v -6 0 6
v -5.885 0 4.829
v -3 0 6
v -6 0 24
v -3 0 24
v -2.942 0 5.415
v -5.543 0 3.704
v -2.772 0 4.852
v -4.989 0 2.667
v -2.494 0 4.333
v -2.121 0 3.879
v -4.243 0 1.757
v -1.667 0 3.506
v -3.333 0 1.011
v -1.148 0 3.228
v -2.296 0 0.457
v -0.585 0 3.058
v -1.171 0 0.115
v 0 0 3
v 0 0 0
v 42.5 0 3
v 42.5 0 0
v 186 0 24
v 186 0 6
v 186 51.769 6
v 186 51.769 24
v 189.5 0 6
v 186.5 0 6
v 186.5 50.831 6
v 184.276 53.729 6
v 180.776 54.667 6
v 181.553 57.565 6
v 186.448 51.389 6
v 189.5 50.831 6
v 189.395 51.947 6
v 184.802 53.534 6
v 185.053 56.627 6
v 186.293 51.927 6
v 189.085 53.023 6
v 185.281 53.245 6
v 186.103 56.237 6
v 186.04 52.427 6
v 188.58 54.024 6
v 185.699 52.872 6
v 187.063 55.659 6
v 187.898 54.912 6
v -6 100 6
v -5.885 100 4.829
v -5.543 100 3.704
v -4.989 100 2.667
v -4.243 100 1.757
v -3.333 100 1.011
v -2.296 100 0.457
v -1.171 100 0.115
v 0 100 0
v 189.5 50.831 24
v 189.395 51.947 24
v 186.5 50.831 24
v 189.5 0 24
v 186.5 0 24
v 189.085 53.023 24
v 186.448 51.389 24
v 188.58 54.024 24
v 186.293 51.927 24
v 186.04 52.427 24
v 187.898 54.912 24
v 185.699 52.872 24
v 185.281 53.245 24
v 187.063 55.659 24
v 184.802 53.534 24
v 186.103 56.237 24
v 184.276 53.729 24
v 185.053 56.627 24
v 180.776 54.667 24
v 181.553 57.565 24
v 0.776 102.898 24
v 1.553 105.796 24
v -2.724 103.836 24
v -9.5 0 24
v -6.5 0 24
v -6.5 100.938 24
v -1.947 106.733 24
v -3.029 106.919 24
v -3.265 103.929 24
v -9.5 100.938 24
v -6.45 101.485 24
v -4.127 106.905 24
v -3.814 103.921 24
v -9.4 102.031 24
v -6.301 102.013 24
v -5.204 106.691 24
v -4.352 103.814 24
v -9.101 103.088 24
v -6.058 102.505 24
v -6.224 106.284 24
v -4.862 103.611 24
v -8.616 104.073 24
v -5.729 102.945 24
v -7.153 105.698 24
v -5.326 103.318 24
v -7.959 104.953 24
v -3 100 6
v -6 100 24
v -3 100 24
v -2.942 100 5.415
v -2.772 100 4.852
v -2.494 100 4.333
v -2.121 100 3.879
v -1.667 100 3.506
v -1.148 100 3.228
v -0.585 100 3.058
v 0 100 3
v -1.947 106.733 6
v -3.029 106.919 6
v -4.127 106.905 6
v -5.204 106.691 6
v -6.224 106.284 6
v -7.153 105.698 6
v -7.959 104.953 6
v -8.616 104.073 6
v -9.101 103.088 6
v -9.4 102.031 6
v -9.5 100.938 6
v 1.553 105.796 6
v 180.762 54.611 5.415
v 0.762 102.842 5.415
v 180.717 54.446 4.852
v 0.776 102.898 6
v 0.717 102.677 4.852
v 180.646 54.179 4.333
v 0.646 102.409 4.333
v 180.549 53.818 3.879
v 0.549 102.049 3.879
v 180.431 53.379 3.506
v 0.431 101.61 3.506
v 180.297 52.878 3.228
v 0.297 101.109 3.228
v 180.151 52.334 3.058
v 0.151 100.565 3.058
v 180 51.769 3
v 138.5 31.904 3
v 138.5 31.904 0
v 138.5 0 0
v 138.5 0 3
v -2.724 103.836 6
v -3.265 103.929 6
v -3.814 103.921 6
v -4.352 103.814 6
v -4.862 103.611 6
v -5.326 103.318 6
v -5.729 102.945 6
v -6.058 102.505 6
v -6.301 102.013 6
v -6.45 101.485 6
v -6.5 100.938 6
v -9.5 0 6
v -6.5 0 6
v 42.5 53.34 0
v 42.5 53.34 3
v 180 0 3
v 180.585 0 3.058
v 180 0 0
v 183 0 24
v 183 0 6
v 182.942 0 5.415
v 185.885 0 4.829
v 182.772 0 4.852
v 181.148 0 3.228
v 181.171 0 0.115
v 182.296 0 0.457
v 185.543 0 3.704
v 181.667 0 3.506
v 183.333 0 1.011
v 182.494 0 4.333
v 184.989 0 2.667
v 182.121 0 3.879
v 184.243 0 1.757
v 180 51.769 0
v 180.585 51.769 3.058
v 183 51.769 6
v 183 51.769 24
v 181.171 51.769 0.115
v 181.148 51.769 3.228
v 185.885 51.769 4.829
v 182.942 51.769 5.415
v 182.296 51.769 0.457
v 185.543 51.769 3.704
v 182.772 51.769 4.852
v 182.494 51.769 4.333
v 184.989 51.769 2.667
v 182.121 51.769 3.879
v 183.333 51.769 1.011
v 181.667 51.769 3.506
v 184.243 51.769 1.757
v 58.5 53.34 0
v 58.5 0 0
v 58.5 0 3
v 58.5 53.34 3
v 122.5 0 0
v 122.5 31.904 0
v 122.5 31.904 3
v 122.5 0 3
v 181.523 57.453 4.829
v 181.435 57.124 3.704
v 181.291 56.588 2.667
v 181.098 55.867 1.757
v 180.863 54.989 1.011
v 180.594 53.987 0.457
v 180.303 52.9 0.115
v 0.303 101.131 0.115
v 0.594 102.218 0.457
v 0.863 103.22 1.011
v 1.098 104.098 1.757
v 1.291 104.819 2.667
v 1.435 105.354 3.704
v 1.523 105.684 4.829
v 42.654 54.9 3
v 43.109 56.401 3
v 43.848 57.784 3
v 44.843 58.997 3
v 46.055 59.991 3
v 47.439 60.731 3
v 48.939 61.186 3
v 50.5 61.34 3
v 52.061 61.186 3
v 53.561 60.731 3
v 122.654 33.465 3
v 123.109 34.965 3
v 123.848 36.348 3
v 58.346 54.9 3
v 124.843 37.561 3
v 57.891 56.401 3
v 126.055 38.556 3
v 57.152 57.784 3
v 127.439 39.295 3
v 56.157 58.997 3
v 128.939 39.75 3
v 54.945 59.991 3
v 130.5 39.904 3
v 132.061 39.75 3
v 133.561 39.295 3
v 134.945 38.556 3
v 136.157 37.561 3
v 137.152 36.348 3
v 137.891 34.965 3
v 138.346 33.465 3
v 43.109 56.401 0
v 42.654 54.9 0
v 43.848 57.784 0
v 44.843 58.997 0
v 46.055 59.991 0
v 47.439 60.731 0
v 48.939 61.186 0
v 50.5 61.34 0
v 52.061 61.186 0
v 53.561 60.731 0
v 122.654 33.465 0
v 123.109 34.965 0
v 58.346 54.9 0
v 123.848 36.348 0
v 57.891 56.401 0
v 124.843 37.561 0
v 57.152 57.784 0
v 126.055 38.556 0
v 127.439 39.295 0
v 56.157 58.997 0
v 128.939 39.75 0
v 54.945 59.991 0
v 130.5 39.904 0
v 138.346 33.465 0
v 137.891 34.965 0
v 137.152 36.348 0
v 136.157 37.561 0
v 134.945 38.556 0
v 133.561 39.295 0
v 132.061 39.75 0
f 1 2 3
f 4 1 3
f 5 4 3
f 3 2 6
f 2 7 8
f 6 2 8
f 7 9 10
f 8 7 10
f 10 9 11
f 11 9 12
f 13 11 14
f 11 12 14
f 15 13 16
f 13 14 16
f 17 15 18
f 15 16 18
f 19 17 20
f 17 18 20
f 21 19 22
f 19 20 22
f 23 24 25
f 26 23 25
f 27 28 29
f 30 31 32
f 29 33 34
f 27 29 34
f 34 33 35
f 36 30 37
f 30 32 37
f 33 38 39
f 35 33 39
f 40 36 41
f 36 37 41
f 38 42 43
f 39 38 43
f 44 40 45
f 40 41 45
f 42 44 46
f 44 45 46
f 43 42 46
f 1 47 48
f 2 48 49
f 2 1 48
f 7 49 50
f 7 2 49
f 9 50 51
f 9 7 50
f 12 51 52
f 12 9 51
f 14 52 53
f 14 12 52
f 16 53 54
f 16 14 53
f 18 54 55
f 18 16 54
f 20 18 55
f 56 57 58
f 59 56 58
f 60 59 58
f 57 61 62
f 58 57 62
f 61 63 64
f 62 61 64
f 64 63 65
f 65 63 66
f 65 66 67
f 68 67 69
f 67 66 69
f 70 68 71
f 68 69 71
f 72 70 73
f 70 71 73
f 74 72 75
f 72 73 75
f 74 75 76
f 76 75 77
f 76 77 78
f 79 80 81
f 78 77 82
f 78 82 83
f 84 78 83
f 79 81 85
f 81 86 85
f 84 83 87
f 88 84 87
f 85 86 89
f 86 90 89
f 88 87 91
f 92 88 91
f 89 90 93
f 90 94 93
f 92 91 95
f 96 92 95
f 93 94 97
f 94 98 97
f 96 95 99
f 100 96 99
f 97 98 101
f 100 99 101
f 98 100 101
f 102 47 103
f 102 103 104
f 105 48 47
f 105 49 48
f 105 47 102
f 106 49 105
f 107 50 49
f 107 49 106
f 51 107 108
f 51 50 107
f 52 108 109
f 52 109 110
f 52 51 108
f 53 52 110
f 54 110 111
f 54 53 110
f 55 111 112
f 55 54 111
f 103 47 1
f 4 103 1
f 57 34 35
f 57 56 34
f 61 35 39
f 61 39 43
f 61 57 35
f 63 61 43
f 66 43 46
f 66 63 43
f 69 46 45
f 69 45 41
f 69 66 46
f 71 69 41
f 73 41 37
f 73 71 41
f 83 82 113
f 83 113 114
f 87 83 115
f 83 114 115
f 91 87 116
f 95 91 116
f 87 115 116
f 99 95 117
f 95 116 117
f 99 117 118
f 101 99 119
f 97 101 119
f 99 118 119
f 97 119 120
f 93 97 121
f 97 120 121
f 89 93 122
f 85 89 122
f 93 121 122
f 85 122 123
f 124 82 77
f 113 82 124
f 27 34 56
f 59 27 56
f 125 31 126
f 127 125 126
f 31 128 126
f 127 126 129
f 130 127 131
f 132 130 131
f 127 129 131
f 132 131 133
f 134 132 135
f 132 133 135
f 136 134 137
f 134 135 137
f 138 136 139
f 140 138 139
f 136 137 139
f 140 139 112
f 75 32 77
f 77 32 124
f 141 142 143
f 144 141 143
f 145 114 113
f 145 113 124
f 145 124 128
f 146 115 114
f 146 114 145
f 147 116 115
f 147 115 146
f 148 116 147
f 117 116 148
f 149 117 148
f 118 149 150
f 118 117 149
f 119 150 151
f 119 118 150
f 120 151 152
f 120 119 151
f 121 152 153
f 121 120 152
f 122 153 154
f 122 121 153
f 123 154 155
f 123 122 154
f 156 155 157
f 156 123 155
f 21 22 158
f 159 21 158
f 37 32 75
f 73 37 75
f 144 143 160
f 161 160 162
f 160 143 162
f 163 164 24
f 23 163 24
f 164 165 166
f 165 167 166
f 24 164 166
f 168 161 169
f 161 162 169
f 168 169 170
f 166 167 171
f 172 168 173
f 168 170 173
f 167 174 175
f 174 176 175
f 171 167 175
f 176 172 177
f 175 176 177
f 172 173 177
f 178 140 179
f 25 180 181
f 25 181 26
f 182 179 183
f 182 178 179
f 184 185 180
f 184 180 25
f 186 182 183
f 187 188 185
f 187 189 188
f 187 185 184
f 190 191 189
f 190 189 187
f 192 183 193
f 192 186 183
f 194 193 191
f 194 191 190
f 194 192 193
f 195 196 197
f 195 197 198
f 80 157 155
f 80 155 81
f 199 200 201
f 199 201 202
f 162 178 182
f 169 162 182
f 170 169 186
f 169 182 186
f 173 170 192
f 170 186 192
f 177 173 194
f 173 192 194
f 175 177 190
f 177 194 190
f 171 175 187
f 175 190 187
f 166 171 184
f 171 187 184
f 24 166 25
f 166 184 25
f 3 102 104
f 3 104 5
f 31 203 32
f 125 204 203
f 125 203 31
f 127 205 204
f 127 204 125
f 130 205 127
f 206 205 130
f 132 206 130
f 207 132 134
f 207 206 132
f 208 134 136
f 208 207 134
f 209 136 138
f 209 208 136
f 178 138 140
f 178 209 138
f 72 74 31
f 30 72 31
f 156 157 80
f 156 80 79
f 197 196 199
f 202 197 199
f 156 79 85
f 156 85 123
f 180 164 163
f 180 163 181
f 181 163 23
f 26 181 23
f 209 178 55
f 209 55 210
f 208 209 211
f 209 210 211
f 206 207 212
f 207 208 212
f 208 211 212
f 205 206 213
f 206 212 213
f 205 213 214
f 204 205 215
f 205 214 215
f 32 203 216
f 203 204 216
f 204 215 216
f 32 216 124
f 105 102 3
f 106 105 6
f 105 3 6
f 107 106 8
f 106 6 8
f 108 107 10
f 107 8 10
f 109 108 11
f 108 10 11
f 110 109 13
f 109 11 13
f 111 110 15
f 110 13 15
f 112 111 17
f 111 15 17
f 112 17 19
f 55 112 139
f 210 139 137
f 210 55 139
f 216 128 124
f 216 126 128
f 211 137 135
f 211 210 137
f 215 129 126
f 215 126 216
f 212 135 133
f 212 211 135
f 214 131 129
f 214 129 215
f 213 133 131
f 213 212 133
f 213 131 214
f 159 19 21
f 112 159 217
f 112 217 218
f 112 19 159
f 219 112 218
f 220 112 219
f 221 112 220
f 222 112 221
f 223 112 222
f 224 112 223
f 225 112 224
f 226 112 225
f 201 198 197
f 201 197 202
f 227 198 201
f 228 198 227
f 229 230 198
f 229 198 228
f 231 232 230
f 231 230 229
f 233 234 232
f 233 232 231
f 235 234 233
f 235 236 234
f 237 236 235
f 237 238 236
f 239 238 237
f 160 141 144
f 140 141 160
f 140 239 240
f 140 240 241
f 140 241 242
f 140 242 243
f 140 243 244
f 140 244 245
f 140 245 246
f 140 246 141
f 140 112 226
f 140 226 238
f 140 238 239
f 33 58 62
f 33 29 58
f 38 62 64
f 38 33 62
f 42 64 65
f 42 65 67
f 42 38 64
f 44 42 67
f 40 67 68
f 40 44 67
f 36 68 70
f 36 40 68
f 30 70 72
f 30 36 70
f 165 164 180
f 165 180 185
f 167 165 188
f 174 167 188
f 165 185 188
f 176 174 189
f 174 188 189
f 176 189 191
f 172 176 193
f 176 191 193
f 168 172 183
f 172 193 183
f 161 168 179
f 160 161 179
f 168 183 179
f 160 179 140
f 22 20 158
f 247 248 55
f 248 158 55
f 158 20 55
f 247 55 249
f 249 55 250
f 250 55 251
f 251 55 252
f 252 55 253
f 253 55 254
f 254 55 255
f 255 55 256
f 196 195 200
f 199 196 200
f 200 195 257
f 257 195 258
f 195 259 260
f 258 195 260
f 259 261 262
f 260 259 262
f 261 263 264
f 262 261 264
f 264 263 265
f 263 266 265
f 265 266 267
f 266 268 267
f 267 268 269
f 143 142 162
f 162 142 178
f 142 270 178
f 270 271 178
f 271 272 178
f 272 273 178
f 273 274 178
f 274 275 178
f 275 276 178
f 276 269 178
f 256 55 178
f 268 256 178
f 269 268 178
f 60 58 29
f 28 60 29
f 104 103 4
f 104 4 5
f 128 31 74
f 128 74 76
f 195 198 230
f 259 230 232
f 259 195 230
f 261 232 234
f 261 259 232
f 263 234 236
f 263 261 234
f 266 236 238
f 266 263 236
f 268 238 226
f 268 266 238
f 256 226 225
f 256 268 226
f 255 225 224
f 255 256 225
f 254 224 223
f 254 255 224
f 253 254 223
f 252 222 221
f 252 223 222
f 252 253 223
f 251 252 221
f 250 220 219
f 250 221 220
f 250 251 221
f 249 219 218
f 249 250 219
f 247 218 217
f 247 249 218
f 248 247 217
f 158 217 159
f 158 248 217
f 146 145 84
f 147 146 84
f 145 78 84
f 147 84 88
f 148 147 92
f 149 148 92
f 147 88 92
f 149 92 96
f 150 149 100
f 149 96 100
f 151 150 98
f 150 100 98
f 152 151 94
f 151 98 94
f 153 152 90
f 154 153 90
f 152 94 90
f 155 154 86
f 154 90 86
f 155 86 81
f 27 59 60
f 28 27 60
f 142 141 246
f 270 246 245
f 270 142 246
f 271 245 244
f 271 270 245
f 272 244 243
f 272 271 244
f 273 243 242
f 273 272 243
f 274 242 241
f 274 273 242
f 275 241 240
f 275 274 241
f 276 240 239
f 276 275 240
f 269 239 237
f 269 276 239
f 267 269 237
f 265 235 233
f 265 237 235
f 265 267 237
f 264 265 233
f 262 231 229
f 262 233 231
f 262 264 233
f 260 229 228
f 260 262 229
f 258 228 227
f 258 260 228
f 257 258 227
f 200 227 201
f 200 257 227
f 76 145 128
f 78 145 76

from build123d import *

# Parameters (mm, degrees)
PAD_DEPTH            = 24
THICKNESS_T          = -3
FILLET_R             = 3
FILLET001_R          = 6
POCKET_DEPTH         = 24.001
SKETCH003_W          = 3
SKETCH003_H          = 18
SKETCH005_W          = 3
SKETCH005_H          = 18
POCKET001_DEPTH      = 0.001
POCKET001_DEPTH_BACK = 24.001


with BuildPart() as part:
    # Sketch (on XY_Plane of Origin) → Pad (new body)
    with BuildSketch(Plane.XY):
        Polygon((-6, 0), (186, 0), (186, 56.373107), (-6, 107.819352), align=None)
    extrude(amount=PAD_DEPTH)

    # Thickness
    thickness_openings = [part.faces().sort_by_distance(p)[0] for p in [
        (79.973475, 42.391415, 24),
        (90, 0, 12),
    ]]
    offset(amount=THICKNESS_T, openings=thickness_openings, kind=Kind.INTERSECTION)

    # Fillet
    fillet_edges = [part.edges().sort_by_distance(p)[0] for p in [
        (-3, 51.954838, 3),
        (183, 27.035563, 3),
        (90, 78.990401, 3),
    ]]
    fillet(fillet_edges, radius=FILLET_R)

    # Fillet001
    fillet001_edges = [part.edges().sort_by_distance(p)[0] for p in [
        (90, 82.09623, 0),
        (-6, 53.909676, 0),
        (186, 28.186554, 0),
    ]]
    fillet(fillet001_edges, radius=FILLET001_R)

    # Sketch001 (on Face5 of Fillet001) → Pocket (cut, through all)
    with BuildSketch(Plane(origin=(0, 0, 0), x_dir=(1, 0, 0), z_dir=(0, 0, -1))):
        Polygon((186, -51.769145), (186, -56.373107), (181.552914, -57.5647), (180, -51.769145), align=None)
        Polygon((0, -100), (1.552914, -105.795555), (-6, -107.819352), (-6, -100), align=None)
    extrude(amount=-POCKET_DEPTH, mode=Mode.SUBTRACT)

    # AdditivePipe: sweep along a path in Sketch002
    with BuildLine(Plane.XY.offset(24)) as additivepipe_path:
        Line((0.776457, 102.897777), (-2.723543, 103.8356))
        ThreePointArc((-2.723543, 103.8356), (-5.326284, 103.317882), (-6.5, 100.937822))
        Line((-6.5, 100.937822), (-6.5, 0))
    # Sketch003 (on Face18 of Pocket) → AdditivePipe (sweep)
    with BuildSketch(Plane(origin=(-25, 6.69873, 0), x_dir=(-0.258819, -0.965926, 0), z_dir=(-0.965926, 0.258819, 0))):
        with Locations((-101.092583, 15)):
            Rectangle(SKETCH003_W, SKETCH003_H)
    sweep(path=additivepipe_path.line)

    # AdditivePipe001: sweep along a path in Sketch006
    with BuildLine(Plane.XY.offset(24)) as additivepipe001_path:
        Line((186.5, 0), (186.5, 50.831323))
        ThreePointArc((186.5, 50.831323), (185.88006, 52.657607), (184.276457, 53.729101))
        Line((184.276457, 53.729101), (180.776457, 54.666923))
    # Sketch005 (on Face2 of AdditivePipe) → AdditivePipe001 (sweep)
    with BuildSketch(Plane(origin=(155, -41.532125, 0), x_dir=(0.258819, 0.965926, 0), z_dir=(0.965926, -0.258819, 0))):
        with Locations((101.092583, 15)):
            Rectangle(SKETCH005_W, SKETCH005_H)
    sweep(path=additivepipe001_path.line)

    # Sketch004 (on XY_Plane of Origin) → Pocket001 (cut, two sides)
    with BuildSketch(Plane.XY) as pocket001_sk:
        with BuildLine():
            ThreePointArc((42.5, 0), (50.5, -8), (58.5, 0))
            Line((58.5, 0), (58.5, 53.339728))
            ThreePointArc((58.5, 53.339728), (50.5, 61.339728), (42.5, 53.339728))
            Line((42.5, 0), (42.5, 53.339728))
        make_face()
        with BuildLine():
            ThreePointArc((138.5, 31.903793), (130.5, 39.903793), (122.5, 31.903793))
            Line((122.5, 31.903793), (122.5, 0))
            ThreePointArc((122.5, 0), (130.5, -8), (138.5, 0))
            Line((138.5, 31.903793), (138.5, 0))
        make_face()
    extrude(amount=-POCKET001_DEPTH, mode=Mode.SUBTRACT)
    extrude(pocket001_sk.sketch, amount=POCKET001_DEPTH_BACK, mode=Mode.SUBTRACT)


solid = part.part
